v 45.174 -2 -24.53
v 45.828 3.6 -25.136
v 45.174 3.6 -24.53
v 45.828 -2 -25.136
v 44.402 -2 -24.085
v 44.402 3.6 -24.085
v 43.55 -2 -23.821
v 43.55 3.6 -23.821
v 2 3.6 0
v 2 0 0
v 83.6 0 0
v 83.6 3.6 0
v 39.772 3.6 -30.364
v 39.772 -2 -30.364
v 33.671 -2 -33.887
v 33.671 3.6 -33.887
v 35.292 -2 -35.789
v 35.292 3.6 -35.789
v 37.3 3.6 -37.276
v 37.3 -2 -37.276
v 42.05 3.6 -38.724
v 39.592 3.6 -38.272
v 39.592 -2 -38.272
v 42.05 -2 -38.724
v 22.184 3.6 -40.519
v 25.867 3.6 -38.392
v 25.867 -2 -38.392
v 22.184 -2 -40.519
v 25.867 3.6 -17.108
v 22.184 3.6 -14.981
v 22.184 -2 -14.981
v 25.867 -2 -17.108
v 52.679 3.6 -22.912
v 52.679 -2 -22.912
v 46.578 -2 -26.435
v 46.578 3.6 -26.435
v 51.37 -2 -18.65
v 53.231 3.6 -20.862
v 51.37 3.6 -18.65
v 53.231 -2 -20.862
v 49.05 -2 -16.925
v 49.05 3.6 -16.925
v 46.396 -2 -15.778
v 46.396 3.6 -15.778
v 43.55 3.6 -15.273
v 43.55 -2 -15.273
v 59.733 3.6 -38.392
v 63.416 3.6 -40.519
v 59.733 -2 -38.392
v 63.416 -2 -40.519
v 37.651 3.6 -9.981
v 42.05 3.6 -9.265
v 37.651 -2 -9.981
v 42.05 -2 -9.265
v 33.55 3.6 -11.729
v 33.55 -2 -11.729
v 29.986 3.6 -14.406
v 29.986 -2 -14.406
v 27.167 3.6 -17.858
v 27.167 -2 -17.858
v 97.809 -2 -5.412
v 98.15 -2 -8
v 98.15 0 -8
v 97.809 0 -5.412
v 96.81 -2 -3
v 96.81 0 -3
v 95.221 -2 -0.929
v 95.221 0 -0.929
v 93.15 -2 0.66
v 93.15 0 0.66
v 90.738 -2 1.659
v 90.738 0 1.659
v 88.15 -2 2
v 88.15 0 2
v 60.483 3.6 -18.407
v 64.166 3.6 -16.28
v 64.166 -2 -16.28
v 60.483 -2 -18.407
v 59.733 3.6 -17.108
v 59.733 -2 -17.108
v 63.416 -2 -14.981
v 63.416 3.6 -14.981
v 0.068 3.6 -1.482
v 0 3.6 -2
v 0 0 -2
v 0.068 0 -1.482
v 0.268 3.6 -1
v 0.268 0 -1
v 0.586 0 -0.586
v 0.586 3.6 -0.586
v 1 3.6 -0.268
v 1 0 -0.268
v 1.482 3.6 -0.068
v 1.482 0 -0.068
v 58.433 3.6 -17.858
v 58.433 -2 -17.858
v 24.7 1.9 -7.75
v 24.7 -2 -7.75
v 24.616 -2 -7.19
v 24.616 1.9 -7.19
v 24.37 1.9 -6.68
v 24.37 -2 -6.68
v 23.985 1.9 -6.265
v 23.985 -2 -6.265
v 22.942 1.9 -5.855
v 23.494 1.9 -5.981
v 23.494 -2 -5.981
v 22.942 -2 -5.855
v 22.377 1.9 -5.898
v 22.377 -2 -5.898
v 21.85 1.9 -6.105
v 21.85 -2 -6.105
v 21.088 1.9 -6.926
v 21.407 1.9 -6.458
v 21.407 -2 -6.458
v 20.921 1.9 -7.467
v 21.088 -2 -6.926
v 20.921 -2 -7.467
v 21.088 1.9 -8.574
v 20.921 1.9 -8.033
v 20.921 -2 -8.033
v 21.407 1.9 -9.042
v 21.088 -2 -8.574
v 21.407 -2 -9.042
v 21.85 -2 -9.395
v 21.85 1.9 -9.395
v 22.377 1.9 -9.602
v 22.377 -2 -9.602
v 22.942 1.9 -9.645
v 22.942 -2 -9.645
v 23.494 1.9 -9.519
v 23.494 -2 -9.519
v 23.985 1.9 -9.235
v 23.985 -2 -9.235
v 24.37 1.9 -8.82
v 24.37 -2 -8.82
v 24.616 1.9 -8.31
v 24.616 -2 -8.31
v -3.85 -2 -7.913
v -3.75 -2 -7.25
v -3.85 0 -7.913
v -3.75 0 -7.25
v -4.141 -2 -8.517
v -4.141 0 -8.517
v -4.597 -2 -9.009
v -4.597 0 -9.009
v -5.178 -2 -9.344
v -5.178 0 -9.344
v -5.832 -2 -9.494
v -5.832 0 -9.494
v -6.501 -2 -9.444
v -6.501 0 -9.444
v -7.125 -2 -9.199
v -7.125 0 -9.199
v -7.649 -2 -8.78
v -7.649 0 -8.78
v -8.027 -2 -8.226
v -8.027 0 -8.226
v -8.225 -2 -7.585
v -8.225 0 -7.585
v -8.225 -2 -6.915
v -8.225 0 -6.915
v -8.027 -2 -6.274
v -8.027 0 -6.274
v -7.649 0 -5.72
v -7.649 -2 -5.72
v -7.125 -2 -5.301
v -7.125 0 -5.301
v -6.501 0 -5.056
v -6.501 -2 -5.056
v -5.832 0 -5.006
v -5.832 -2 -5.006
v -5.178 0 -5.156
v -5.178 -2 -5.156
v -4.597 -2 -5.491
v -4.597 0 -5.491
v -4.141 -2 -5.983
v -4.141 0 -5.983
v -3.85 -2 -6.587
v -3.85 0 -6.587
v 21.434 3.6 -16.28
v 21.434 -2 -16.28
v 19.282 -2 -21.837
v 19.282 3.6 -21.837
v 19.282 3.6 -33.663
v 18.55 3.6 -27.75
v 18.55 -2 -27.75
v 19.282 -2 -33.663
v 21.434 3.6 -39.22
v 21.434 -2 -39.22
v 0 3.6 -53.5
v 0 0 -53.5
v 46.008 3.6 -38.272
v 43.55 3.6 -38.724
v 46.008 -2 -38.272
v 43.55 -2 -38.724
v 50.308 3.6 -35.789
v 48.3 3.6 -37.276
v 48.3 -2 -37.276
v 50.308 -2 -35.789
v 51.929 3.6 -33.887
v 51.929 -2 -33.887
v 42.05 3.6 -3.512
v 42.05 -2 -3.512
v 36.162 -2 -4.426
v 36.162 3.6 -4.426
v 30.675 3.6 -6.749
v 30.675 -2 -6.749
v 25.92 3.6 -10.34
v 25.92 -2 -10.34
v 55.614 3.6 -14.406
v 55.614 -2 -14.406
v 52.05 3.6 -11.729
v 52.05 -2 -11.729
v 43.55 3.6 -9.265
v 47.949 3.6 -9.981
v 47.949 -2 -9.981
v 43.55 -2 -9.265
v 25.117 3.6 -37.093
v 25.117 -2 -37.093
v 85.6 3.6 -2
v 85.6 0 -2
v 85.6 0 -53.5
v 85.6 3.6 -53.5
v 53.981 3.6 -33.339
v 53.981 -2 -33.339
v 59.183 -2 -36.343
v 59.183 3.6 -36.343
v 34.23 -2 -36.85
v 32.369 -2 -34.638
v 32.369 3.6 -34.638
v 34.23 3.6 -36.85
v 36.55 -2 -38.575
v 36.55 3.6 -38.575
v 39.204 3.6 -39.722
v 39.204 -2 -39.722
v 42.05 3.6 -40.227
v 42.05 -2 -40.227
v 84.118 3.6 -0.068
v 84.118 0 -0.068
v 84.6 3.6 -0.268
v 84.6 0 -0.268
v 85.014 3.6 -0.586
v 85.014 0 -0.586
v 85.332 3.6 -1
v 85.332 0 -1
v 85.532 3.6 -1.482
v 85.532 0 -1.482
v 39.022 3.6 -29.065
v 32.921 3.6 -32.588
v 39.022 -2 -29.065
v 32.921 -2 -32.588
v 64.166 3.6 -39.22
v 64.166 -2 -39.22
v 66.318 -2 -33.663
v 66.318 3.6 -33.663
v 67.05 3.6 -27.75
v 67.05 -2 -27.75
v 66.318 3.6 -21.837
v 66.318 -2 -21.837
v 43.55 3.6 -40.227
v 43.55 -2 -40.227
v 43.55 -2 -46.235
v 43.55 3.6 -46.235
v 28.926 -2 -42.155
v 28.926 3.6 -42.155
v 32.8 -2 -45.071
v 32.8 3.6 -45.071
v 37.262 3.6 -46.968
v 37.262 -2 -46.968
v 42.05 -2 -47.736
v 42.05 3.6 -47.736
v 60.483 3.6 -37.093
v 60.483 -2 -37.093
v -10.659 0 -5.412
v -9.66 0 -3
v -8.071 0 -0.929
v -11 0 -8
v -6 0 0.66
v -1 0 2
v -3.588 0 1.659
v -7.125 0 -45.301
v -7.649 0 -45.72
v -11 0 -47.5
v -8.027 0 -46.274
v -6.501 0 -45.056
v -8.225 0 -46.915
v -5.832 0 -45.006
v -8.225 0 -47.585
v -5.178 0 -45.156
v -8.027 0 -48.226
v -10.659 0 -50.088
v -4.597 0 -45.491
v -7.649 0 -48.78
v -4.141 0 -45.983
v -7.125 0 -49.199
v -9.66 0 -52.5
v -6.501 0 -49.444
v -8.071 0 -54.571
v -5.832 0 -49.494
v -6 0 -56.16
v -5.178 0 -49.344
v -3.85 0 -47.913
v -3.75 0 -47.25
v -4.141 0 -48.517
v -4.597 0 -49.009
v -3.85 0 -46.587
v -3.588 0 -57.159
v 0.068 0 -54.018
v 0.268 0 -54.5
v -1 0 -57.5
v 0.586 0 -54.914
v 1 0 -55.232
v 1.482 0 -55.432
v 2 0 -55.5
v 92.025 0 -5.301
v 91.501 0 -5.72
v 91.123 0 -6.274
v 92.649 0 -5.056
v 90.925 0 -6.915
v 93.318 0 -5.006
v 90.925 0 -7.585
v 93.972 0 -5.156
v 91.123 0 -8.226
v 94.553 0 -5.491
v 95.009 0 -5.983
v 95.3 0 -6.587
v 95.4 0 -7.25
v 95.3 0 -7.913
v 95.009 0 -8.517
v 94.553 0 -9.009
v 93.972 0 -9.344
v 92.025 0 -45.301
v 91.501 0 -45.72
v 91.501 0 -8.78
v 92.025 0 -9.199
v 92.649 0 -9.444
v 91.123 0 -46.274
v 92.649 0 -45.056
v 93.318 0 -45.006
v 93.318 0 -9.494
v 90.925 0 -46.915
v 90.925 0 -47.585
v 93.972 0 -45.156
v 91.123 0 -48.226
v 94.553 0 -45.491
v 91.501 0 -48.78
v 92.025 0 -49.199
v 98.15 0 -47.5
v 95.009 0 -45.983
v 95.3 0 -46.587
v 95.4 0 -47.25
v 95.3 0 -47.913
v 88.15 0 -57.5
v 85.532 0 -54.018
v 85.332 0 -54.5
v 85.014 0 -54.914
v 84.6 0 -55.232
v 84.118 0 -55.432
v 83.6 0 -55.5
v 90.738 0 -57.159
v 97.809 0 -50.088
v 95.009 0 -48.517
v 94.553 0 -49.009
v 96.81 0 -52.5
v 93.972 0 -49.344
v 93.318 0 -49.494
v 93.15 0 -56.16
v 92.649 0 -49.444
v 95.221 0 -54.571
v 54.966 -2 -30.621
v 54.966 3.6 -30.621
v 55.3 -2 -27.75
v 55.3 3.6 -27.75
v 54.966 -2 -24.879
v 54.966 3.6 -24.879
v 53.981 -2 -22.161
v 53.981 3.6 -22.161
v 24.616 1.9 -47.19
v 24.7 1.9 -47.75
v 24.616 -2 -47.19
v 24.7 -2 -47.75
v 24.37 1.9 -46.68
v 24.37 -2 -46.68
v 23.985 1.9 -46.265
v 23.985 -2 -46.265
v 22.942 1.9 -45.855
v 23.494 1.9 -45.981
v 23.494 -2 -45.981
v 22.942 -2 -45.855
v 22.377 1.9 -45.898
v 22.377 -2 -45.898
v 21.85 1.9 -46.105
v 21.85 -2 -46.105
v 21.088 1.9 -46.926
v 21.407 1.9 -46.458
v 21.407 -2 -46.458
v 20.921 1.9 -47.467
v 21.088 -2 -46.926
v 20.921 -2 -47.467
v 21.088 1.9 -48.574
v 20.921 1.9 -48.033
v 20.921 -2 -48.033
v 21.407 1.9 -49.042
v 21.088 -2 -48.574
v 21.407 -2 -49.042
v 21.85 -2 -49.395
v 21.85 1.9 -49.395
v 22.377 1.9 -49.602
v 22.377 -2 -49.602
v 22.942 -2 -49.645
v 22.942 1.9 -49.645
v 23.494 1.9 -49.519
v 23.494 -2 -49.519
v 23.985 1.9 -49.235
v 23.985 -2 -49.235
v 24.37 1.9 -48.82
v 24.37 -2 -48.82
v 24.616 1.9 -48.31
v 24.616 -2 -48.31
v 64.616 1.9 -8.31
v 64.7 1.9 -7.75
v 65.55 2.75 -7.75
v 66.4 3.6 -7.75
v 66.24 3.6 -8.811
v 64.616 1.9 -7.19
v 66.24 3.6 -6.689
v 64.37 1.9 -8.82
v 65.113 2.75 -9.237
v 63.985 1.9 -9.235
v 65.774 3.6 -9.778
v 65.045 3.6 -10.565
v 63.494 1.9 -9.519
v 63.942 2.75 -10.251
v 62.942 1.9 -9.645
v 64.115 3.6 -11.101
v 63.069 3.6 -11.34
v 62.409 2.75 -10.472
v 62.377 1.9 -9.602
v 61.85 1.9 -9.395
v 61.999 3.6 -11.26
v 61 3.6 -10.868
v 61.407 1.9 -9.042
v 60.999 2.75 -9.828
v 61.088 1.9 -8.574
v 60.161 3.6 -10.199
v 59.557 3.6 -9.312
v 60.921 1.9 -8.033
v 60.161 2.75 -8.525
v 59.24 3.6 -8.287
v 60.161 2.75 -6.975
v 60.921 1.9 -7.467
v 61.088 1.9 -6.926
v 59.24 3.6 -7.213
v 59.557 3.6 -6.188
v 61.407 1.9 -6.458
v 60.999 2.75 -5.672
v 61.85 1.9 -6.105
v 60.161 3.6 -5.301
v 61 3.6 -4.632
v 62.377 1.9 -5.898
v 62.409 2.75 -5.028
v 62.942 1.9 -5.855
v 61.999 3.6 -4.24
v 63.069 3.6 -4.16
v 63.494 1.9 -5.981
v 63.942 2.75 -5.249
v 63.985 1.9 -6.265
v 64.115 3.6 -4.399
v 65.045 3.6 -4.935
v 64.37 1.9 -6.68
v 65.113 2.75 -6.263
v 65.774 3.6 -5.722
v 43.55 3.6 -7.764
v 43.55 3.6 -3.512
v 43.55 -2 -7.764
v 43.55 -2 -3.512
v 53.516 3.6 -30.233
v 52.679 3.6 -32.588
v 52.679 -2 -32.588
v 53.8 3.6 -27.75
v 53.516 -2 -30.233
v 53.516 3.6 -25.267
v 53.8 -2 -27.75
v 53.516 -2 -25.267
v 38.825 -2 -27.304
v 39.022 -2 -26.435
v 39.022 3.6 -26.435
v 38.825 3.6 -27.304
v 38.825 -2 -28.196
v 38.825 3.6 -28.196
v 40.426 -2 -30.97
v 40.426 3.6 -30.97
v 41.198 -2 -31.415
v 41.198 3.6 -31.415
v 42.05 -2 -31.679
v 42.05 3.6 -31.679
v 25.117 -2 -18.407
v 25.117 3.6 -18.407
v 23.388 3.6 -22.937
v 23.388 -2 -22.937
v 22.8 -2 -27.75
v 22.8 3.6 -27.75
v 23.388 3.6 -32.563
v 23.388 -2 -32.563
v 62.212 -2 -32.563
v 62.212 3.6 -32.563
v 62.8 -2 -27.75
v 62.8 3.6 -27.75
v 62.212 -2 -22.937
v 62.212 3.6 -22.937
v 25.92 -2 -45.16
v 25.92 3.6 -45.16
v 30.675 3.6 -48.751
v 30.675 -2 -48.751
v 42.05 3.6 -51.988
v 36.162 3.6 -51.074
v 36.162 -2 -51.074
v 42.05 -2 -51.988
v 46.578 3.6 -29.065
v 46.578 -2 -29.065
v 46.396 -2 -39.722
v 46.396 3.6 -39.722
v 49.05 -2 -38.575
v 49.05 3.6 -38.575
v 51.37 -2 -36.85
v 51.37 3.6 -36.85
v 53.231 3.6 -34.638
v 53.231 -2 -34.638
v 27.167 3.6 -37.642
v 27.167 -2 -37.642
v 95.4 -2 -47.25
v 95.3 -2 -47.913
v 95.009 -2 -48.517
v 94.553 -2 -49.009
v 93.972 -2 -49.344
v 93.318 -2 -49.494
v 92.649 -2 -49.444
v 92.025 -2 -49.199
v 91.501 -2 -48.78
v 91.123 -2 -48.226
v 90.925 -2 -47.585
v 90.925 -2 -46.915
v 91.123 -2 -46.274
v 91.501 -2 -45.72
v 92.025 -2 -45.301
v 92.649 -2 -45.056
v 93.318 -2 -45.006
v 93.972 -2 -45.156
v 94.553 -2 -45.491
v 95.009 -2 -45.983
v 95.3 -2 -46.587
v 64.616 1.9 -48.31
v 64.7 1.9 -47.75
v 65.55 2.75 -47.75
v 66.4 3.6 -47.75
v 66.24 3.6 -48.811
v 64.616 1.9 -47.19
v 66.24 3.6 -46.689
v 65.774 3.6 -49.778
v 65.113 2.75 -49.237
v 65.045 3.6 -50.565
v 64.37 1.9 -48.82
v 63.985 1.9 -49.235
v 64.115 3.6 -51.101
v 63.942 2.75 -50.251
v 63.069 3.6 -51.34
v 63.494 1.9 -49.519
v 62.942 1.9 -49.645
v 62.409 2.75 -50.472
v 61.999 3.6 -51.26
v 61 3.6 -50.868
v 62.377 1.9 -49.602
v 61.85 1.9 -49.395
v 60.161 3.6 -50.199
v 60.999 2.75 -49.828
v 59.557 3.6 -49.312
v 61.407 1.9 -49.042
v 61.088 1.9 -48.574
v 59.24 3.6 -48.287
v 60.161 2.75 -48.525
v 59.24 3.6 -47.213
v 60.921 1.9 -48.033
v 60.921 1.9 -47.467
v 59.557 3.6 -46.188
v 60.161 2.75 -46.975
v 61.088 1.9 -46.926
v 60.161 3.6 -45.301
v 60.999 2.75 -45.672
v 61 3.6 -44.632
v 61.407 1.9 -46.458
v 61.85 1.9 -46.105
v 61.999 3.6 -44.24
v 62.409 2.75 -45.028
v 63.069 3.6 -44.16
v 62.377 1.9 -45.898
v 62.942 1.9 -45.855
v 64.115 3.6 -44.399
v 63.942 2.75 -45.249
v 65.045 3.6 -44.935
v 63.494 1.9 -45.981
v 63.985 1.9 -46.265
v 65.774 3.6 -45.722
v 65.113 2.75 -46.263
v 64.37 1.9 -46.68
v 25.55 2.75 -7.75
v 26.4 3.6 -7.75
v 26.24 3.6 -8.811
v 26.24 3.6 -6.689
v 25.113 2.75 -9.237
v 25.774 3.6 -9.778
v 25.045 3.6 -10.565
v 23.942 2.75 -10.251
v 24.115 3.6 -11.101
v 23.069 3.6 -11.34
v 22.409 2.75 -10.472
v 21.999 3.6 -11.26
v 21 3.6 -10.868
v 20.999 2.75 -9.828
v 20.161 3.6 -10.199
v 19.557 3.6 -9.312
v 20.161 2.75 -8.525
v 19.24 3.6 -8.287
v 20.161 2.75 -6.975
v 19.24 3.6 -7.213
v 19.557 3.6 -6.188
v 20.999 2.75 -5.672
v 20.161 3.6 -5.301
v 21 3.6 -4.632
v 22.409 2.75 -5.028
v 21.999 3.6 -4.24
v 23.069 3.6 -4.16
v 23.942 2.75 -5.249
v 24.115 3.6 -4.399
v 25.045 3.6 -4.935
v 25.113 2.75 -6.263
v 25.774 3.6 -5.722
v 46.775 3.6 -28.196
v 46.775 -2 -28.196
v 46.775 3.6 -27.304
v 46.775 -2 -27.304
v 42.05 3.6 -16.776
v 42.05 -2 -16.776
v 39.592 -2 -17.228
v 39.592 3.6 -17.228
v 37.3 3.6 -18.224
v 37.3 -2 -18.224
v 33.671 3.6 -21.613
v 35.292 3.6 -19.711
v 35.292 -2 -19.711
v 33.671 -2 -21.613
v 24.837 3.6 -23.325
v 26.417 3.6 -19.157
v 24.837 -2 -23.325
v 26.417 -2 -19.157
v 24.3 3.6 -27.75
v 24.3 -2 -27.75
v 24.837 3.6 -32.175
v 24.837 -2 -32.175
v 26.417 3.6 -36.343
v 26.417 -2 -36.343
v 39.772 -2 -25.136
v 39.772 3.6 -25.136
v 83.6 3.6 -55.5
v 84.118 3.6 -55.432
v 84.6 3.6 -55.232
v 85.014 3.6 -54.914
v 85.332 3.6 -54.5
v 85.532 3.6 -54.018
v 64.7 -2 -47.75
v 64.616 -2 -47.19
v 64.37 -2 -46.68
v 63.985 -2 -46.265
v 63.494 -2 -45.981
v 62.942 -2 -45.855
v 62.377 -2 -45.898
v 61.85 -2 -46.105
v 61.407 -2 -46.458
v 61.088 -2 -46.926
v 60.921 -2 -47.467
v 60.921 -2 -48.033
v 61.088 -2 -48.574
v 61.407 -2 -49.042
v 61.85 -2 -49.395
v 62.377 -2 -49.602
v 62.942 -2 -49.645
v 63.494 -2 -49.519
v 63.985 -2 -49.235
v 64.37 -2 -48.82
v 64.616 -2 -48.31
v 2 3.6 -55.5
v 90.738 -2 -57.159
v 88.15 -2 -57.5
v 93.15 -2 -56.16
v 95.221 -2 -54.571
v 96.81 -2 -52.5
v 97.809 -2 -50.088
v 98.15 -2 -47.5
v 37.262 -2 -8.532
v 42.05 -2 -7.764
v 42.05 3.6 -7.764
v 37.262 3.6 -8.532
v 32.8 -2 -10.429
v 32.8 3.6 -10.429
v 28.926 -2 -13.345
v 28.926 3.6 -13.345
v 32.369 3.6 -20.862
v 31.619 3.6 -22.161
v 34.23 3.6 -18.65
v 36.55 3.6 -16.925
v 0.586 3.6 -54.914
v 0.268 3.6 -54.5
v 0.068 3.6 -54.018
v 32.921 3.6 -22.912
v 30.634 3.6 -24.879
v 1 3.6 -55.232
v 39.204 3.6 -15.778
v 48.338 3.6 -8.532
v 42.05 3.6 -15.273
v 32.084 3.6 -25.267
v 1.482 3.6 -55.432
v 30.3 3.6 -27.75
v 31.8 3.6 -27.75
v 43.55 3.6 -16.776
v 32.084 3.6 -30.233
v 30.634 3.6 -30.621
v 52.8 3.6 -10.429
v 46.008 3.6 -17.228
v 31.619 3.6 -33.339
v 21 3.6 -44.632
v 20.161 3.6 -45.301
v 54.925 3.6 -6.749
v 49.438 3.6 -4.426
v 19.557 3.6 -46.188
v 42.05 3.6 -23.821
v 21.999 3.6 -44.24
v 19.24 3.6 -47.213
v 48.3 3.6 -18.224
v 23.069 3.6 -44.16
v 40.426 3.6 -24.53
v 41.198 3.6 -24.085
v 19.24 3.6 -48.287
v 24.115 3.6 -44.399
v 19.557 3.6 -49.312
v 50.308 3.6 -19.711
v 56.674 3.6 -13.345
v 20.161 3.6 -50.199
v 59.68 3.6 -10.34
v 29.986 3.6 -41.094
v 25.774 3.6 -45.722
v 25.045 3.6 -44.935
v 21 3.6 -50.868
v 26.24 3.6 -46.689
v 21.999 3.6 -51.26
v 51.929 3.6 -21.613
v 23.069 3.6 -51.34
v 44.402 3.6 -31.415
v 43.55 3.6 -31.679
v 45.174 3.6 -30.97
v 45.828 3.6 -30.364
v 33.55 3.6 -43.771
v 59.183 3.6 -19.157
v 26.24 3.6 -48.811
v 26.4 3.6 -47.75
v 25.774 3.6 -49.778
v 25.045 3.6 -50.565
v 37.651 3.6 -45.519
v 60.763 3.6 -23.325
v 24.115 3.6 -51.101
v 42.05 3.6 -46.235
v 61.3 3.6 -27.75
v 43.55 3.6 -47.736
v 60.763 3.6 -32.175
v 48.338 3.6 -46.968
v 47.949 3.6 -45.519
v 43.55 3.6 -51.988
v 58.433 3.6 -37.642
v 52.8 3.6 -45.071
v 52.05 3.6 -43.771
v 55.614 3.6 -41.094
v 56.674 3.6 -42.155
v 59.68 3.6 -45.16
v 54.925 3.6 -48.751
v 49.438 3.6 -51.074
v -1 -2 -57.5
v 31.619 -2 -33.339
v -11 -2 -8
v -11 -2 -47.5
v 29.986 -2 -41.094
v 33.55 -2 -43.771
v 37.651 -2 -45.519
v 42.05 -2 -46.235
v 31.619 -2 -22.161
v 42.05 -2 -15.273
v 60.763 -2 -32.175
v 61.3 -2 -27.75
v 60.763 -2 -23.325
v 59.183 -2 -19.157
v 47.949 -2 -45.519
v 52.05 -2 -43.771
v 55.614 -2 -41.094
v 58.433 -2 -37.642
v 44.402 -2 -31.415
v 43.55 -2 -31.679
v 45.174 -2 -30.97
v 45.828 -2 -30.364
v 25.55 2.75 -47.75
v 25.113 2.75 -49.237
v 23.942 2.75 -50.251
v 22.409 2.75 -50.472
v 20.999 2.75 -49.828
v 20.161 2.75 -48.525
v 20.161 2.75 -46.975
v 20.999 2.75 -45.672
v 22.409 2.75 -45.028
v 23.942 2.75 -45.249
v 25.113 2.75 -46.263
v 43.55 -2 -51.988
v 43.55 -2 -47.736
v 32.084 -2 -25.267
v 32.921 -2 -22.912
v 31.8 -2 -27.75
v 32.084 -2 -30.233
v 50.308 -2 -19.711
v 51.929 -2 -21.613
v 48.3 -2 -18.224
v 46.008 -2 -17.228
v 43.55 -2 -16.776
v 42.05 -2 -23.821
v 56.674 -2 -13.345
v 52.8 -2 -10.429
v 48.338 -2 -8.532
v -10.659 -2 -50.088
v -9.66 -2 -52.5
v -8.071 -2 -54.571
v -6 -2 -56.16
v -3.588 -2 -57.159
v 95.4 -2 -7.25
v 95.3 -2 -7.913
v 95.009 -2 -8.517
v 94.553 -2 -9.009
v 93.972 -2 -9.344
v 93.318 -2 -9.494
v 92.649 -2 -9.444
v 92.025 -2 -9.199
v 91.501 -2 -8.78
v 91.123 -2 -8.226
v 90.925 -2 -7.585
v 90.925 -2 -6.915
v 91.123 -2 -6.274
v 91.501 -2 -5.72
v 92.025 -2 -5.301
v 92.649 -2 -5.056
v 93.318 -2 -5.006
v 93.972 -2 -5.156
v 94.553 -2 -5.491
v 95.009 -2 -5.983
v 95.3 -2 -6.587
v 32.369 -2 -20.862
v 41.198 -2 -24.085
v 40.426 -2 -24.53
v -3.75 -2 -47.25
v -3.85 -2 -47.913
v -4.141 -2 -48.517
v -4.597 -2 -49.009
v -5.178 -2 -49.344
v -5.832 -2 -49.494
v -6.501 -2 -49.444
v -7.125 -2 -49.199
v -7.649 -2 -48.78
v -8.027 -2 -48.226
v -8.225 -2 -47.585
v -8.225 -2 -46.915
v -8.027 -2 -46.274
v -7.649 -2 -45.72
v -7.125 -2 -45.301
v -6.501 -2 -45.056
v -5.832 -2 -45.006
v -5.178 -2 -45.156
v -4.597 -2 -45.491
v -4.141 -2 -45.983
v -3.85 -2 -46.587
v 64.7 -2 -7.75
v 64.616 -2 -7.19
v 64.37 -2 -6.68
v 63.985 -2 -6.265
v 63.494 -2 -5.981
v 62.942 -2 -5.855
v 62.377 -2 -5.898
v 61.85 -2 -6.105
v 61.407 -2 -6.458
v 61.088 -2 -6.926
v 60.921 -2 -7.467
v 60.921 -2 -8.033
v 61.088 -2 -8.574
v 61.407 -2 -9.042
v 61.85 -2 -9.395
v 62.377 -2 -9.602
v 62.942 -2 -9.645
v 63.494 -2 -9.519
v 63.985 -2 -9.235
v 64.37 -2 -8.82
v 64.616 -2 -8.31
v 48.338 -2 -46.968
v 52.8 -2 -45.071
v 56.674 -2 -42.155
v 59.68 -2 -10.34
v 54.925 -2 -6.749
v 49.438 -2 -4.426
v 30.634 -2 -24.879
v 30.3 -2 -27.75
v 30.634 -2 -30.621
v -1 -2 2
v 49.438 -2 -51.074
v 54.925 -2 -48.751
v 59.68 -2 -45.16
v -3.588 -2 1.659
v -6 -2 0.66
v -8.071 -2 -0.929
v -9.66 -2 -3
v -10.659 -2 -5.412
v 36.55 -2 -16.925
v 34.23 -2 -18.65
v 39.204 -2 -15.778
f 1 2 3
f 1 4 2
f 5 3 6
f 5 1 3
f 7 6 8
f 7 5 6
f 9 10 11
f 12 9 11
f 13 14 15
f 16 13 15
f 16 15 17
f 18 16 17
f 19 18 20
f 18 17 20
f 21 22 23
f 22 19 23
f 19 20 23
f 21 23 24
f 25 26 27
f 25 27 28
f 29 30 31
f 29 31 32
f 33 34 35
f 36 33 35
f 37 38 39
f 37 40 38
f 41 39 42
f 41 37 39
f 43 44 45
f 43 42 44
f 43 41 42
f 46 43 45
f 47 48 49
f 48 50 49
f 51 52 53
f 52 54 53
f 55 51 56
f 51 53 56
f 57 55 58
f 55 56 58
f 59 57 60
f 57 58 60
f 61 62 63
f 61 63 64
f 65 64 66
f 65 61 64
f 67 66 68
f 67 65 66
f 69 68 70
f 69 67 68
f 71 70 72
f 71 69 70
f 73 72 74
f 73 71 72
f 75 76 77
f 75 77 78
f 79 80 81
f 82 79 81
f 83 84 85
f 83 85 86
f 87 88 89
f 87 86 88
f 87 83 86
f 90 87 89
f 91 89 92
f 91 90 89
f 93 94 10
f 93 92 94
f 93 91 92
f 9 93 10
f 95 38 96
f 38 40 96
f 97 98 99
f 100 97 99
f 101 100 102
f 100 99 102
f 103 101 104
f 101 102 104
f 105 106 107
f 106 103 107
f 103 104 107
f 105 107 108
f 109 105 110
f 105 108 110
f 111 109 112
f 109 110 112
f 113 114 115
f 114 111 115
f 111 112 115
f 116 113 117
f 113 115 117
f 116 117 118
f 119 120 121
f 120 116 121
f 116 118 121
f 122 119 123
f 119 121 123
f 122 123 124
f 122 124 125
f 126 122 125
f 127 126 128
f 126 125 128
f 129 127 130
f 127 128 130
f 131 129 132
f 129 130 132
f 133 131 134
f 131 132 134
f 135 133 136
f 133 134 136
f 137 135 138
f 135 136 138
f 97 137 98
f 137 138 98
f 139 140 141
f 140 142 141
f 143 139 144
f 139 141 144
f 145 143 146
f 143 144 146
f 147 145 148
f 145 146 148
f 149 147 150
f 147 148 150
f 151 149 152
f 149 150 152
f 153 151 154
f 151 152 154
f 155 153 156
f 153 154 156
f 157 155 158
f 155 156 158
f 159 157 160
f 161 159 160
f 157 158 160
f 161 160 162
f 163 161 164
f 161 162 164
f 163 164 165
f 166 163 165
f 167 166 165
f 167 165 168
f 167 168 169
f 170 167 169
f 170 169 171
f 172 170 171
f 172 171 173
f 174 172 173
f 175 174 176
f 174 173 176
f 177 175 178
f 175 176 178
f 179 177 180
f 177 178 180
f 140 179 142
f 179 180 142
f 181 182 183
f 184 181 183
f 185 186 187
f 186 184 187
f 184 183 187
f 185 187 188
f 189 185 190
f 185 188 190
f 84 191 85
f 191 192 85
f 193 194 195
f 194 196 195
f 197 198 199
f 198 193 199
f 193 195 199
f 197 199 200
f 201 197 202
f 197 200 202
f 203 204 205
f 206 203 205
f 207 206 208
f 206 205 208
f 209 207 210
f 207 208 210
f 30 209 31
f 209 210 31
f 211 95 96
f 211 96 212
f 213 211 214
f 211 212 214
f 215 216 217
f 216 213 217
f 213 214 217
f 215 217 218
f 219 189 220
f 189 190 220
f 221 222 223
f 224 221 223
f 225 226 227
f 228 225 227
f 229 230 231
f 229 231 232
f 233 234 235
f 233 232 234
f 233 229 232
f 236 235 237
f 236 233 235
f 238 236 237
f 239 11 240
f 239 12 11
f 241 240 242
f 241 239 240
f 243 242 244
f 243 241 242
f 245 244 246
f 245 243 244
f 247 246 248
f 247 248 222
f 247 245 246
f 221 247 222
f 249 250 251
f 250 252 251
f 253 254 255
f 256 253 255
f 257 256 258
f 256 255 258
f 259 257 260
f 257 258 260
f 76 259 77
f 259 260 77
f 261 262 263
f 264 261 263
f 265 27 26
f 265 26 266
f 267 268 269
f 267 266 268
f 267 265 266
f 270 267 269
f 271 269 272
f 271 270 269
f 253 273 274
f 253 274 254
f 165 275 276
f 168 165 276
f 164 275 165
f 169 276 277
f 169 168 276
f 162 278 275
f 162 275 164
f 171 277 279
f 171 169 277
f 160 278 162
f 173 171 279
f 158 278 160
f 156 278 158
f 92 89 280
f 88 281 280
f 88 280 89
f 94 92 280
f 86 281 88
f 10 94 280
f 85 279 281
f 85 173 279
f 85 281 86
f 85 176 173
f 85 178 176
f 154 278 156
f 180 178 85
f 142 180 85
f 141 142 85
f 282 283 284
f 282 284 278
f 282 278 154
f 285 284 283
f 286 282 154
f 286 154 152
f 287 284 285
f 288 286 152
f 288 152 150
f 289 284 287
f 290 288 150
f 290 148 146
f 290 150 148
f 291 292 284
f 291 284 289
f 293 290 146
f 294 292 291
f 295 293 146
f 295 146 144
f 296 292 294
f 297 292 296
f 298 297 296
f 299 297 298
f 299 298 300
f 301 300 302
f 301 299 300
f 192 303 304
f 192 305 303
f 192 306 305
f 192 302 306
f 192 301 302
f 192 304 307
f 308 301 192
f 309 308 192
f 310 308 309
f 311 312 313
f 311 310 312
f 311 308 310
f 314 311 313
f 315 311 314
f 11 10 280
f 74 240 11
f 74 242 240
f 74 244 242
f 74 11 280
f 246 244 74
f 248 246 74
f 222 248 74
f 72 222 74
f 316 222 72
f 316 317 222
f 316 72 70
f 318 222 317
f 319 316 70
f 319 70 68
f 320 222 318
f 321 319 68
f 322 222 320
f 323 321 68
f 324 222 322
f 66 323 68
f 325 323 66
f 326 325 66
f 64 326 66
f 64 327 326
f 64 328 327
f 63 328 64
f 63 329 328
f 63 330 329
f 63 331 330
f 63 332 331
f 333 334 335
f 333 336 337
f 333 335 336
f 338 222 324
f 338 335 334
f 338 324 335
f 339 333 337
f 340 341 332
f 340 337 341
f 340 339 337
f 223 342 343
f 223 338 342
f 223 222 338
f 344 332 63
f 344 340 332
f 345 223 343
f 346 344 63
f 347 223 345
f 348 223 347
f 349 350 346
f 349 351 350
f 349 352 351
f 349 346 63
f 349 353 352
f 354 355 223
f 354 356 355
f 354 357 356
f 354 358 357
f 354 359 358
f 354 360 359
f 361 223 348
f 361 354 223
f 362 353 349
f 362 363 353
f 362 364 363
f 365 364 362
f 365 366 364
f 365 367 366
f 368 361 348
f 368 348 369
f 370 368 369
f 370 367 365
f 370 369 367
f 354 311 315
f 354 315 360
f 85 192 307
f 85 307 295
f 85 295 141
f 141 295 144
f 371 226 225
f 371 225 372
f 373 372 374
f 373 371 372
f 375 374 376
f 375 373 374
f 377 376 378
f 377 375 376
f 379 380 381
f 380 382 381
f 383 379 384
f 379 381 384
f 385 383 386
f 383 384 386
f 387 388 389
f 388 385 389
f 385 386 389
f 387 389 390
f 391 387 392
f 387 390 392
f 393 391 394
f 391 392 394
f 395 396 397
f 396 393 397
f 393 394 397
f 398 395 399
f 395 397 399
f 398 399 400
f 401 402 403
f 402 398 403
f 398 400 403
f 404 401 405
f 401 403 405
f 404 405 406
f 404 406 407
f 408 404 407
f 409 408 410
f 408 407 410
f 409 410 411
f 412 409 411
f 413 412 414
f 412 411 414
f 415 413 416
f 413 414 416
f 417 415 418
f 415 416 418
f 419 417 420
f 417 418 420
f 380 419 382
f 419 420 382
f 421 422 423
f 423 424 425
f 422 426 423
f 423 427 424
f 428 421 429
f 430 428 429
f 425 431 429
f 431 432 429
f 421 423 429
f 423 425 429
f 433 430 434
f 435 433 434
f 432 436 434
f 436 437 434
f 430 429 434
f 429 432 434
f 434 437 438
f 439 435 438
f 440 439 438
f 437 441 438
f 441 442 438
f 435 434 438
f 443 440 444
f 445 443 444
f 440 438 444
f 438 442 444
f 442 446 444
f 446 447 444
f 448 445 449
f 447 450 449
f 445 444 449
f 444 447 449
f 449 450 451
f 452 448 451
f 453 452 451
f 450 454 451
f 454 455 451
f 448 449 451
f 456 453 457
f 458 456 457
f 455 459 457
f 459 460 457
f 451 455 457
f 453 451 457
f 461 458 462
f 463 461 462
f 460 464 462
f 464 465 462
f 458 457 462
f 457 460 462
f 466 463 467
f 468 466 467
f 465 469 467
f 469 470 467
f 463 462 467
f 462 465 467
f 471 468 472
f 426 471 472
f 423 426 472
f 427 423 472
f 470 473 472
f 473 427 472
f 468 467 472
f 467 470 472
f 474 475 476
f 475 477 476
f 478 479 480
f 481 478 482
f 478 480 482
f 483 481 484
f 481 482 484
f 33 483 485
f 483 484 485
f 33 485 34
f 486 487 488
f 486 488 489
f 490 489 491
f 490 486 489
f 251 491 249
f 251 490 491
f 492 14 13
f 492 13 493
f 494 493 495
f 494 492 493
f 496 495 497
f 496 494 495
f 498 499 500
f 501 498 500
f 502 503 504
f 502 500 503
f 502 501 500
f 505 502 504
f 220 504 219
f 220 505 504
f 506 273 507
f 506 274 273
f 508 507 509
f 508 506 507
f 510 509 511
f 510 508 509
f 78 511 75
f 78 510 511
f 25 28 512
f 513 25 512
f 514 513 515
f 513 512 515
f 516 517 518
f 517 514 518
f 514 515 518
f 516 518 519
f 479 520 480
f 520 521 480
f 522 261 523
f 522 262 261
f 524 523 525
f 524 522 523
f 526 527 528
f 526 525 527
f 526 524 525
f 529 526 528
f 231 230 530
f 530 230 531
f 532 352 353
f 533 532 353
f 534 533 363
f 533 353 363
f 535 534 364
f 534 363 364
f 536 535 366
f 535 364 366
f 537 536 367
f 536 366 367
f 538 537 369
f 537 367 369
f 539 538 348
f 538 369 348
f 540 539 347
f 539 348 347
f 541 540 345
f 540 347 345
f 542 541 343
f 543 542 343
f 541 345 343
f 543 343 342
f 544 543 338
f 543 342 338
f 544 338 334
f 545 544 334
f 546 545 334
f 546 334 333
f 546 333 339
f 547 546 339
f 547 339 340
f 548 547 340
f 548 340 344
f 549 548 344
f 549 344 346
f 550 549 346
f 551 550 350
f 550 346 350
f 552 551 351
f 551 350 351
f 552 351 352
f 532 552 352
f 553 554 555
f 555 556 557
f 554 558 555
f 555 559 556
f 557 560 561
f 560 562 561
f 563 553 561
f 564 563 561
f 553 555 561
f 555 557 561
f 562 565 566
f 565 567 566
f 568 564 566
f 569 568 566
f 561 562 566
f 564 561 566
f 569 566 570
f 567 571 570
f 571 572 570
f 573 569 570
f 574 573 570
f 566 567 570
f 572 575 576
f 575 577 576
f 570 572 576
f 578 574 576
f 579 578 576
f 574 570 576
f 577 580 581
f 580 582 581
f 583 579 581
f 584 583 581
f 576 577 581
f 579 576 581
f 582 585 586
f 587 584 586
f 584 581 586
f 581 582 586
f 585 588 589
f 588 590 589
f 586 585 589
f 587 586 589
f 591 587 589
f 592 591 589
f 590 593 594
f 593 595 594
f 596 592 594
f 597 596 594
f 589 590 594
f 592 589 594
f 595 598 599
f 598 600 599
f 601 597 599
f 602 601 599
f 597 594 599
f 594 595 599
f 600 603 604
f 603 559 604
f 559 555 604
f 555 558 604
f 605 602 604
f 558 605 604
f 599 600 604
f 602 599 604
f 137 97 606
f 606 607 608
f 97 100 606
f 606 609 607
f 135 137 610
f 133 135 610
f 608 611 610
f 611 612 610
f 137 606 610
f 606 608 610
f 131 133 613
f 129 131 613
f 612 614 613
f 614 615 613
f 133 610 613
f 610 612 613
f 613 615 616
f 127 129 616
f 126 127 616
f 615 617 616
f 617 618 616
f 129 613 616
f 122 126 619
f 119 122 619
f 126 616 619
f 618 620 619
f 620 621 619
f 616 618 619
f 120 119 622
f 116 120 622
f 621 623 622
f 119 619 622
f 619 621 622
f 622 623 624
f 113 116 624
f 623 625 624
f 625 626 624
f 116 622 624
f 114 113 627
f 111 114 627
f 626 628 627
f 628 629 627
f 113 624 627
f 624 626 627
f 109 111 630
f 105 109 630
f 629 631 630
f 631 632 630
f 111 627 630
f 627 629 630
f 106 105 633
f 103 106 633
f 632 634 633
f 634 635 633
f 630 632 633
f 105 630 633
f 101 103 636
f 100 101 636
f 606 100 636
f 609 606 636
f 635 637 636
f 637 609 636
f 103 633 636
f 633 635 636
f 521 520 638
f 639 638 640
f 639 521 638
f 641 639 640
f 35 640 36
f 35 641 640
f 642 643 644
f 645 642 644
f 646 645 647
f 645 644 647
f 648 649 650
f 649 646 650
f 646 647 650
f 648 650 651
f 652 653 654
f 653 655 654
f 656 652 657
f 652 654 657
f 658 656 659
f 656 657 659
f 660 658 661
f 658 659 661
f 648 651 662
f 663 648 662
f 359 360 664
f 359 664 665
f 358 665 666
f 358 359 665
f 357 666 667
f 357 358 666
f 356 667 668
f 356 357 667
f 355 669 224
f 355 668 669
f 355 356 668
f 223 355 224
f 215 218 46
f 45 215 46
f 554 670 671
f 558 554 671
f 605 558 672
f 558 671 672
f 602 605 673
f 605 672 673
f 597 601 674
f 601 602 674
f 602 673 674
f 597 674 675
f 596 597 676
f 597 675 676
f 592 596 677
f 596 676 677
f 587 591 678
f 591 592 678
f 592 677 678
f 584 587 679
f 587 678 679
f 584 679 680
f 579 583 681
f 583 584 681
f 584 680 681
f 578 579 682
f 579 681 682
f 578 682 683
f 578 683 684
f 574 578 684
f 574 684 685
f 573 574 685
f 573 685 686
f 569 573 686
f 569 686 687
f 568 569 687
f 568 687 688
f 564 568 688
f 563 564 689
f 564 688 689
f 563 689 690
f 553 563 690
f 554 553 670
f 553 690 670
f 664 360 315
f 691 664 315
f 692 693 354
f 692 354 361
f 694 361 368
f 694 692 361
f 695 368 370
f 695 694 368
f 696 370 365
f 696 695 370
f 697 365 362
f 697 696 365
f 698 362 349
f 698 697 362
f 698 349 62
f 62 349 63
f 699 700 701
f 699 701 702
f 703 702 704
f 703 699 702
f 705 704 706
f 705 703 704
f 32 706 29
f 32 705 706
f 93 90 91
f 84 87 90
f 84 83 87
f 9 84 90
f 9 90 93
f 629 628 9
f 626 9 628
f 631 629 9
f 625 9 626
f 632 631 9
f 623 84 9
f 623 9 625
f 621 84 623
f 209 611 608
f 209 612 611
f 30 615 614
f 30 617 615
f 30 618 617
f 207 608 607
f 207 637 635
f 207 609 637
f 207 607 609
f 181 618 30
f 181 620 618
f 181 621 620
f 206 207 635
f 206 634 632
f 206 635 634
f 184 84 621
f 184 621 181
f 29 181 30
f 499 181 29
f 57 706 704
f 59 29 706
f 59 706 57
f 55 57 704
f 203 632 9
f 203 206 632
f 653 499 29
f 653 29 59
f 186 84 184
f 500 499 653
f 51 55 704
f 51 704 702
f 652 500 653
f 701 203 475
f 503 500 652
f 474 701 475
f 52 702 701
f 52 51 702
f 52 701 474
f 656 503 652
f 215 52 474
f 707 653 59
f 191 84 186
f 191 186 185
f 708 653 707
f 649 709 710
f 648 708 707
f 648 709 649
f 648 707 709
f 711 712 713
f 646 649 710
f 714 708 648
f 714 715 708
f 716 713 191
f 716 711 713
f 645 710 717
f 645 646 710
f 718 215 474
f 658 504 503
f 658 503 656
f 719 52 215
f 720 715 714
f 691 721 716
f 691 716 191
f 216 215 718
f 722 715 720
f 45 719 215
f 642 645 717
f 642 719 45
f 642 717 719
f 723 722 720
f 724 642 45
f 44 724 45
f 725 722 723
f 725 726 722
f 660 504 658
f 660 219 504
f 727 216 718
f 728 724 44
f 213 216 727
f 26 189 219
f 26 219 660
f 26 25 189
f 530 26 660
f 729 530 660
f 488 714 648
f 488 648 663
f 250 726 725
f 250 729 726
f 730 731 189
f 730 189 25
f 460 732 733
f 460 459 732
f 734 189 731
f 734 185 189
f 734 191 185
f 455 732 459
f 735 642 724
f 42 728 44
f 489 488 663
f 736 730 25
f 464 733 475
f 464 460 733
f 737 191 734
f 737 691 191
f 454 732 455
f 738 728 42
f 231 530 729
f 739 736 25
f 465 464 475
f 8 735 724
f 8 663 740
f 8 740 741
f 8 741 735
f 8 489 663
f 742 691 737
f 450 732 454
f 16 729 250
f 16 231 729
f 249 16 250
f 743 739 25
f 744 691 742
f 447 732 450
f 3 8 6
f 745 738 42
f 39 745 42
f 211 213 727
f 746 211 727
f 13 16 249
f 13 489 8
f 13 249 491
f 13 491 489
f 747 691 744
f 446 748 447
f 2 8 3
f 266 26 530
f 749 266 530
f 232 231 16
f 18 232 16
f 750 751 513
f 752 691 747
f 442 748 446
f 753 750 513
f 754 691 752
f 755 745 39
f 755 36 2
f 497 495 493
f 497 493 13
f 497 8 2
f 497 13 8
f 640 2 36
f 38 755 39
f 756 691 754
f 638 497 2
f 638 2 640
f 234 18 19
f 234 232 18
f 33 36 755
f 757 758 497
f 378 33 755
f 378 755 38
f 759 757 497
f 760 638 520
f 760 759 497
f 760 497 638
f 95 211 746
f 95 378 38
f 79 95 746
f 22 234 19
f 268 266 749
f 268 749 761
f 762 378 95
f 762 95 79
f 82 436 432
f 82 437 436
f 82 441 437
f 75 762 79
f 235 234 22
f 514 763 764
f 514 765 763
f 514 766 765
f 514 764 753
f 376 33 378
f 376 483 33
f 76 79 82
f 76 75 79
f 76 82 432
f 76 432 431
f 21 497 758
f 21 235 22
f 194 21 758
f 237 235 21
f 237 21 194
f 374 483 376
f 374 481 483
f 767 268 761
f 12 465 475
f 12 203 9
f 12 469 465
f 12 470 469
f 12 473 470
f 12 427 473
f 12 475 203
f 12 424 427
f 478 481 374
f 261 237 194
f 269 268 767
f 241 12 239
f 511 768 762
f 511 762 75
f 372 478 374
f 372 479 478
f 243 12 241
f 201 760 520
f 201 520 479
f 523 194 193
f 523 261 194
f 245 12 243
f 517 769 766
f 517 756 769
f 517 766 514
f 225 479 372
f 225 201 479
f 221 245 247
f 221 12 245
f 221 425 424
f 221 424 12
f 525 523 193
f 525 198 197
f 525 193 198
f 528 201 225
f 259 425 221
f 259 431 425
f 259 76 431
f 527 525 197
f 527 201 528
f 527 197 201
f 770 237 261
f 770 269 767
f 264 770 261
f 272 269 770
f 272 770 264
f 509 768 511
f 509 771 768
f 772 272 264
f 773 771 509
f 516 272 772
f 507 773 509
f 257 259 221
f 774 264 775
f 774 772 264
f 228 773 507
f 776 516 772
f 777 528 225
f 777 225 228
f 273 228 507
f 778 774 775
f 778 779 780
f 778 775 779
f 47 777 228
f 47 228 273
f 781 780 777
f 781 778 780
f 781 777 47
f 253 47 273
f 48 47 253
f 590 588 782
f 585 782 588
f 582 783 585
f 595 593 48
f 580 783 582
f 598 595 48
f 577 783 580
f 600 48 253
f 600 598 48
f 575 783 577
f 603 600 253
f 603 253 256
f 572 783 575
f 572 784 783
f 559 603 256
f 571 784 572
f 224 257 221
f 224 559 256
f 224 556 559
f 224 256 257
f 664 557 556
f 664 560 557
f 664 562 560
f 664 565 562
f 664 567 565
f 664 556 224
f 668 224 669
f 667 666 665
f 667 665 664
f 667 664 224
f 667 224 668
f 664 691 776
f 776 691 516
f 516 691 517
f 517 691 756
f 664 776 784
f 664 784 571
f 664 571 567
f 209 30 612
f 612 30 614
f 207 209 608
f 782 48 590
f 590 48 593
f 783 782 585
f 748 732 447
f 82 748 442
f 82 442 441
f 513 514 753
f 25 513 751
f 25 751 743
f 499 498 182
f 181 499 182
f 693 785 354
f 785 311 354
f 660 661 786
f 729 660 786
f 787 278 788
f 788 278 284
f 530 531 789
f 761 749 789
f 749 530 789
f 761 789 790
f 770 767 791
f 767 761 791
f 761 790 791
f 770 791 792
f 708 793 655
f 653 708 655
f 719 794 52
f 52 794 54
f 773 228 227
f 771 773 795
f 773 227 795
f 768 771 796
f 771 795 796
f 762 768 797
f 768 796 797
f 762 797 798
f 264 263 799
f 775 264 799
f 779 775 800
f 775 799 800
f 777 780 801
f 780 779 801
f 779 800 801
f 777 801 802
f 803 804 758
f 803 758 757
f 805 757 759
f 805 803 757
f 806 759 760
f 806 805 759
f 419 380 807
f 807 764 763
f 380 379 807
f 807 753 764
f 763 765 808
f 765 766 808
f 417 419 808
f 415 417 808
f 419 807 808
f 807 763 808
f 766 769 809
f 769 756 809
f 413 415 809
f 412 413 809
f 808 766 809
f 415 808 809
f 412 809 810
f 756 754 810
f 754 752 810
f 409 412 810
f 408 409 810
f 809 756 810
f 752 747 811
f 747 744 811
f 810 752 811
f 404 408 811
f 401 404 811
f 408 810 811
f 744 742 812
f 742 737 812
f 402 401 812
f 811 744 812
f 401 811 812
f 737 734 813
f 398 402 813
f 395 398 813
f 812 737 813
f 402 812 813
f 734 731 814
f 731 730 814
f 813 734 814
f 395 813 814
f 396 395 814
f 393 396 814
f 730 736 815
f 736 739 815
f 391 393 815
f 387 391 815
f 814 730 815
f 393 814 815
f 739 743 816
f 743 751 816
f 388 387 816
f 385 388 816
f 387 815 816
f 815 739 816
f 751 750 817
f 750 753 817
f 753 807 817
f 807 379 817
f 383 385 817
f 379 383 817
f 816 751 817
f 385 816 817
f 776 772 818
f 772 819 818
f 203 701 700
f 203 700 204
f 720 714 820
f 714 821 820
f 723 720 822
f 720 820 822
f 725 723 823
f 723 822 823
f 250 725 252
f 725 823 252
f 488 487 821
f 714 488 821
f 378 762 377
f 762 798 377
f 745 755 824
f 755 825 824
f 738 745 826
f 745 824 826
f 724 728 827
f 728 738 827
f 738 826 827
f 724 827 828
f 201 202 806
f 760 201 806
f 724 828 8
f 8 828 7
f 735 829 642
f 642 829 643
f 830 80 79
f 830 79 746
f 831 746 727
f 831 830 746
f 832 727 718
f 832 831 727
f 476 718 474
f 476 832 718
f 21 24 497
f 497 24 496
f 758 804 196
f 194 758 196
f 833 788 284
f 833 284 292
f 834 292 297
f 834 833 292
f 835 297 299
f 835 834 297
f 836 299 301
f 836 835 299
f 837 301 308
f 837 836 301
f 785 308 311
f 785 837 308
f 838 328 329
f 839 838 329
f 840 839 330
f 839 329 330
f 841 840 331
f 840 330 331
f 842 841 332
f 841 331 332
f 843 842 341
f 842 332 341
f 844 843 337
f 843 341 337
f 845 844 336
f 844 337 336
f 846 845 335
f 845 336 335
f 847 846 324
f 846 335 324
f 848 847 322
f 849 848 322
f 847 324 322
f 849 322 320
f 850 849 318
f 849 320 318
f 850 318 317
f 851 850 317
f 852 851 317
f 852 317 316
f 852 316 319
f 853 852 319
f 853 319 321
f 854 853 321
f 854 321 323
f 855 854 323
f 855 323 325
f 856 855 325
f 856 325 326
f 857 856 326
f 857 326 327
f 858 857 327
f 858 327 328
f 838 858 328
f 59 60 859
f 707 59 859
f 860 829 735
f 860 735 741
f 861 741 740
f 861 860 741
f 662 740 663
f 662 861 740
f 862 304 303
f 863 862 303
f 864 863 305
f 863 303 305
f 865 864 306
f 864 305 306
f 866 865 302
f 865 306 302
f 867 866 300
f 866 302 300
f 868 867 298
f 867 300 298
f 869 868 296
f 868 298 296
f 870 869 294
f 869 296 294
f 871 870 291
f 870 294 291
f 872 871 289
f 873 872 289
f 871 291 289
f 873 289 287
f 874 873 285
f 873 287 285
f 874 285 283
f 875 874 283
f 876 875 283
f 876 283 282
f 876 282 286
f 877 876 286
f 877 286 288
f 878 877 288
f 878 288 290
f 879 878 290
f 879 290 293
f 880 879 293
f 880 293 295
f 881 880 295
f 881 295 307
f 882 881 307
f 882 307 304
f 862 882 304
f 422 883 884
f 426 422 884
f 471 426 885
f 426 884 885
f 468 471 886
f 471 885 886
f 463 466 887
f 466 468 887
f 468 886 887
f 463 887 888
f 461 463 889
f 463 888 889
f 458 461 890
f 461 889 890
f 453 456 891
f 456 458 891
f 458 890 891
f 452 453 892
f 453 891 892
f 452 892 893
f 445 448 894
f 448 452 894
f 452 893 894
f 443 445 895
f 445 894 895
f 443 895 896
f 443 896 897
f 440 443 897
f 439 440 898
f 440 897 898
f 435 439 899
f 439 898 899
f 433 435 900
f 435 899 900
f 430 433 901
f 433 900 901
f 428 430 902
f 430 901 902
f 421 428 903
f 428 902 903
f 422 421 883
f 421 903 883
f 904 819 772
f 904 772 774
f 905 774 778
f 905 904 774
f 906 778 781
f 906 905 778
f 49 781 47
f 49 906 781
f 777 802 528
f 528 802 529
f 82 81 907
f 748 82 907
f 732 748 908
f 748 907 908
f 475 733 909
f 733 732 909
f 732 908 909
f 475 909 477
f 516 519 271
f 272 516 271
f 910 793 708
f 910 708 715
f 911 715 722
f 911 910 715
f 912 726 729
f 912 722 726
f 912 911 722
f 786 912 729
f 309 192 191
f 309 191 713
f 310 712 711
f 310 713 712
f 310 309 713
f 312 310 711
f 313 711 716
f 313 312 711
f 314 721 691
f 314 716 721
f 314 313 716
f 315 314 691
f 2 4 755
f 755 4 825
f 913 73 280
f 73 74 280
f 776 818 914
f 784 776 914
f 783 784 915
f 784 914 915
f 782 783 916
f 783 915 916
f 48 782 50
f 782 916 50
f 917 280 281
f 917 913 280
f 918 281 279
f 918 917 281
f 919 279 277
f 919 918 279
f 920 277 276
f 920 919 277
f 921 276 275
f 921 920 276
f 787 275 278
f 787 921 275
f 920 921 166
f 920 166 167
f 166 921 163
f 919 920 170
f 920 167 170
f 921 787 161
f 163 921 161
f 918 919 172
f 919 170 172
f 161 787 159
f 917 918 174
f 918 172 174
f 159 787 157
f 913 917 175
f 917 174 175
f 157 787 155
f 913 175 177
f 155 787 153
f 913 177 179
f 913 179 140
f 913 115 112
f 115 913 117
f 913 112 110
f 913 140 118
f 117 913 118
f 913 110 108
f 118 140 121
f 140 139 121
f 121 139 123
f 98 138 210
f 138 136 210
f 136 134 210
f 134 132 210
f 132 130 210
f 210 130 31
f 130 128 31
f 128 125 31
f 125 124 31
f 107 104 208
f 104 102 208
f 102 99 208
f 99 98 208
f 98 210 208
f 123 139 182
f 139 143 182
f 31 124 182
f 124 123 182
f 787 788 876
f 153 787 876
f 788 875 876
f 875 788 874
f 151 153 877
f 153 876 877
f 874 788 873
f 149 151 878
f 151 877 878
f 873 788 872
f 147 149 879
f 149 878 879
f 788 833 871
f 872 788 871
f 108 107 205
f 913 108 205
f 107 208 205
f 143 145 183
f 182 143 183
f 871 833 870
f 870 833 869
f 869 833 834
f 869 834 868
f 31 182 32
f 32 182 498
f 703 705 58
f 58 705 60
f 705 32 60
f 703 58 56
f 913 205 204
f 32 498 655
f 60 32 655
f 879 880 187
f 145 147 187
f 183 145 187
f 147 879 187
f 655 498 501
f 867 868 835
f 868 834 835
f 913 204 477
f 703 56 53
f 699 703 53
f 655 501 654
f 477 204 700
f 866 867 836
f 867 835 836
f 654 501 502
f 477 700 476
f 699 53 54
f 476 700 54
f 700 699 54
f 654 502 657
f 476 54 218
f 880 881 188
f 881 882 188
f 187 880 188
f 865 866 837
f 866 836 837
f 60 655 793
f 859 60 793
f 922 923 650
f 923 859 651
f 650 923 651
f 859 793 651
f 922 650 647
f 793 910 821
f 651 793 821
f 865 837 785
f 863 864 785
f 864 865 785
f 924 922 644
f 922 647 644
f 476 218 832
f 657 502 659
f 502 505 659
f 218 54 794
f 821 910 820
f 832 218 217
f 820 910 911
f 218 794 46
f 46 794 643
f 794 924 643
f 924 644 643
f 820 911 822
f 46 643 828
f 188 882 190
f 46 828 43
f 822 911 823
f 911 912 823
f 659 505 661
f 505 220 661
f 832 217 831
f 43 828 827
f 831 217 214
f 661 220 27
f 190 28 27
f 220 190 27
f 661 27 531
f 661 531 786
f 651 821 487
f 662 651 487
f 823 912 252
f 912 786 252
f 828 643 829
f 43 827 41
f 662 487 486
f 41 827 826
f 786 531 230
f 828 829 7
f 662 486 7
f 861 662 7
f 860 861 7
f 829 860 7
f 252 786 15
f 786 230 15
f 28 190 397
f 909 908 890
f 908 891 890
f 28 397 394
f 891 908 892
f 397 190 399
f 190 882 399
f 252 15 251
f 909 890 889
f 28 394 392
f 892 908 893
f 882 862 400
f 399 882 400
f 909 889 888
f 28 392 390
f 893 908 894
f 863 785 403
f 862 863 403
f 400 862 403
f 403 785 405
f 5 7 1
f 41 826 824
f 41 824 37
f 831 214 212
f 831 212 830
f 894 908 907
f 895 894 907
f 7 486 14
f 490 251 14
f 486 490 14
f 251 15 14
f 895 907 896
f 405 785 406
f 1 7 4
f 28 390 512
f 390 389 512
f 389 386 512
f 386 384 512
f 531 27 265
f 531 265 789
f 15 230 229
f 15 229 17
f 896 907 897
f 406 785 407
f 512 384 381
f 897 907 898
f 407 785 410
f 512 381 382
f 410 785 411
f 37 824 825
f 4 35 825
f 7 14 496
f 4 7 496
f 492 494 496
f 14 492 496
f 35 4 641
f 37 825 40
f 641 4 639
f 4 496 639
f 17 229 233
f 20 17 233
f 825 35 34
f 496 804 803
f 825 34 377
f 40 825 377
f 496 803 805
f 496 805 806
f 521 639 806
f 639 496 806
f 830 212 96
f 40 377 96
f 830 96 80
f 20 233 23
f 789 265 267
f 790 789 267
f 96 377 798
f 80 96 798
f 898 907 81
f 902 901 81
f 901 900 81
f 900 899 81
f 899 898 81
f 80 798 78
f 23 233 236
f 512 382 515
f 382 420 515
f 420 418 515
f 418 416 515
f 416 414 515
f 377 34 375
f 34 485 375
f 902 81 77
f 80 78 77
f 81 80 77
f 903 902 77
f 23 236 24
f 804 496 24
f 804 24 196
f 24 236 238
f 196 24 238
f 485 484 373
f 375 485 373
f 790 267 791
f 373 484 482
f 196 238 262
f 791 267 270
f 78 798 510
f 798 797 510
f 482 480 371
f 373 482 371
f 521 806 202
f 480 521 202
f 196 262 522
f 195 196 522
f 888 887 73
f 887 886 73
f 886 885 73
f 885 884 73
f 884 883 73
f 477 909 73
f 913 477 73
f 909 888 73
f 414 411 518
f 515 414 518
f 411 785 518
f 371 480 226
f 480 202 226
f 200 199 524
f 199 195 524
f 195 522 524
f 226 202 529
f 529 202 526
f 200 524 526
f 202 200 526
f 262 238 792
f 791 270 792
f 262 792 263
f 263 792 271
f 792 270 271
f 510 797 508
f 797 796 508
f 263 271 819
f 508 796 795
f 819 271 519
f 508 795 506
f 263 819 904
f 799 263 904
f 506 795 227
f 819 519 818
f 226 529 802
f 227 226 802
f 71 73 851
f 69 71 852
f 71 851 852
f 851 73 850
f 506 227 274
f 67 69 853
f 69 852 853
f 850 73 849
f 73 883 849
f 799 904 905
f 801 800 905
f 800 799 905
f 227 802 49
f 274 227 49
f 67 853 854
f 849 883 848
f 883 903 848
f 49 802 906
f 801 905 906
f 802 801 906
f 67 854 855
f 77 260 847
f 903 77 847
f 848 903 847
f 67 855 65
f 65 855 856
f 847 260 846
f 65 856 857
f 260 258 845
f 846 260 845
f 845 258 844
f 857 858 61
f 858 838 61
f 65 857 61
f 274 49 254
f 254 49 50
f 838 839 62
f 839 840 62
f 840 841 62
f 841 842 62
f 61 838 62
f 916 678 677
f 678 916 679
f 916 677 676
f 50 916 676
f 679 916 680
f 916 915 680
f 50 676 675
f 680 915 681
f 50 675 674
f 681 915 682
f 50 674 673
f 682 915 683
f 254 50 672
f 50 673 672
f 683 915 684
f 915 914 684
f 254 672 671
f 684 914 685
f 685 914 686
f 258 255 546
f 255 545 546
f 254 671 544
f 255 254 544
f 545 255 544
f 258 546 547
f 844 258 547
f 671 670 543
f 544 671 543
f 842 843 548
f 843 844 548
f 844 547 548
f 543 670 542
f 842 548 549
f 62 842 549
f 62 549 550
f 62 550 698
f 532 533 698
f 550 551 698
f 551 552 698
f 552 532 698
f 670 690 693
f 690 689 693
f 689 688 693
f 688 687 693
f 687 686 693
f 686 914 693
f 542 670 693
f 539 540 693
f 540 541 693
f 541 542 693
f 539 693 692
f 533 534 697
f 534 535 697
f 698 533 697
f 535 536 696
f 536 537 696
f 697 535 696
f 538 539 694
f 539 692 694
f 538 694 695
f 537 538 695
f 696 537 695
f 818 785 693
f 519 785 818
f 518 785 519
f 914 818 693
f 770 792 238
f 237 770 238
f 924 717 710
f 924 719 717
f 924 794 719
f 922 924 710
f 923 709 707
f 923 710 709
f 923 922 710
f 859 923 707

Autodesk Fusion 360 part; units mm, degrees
sketch "Sketch1" plane through (0, 0, 0) normal (0, 1, 0) x (1, 0, 0)
  line L0 (0, 0) -> (85.6, 0)
  line L1 (85.6, 0) -> (85.6, 55.5)
  line L2 (85.6, 55.5) -> (0, 55.5)
  line L3 (0, 55.5) -> (0, 0)
  line L4 (0, 55.5) -> (85.6, 0) construction
  line L5 (0, 0) -> (85.6, 55.5) construction
  line L6 (62.8, 47.75) -> (22.8, 47.75) construction
  line L7 (22.8, 47.75) -> (22.8, 7.75) construction
  line L8 (22.8, 7.75) -> (62.8, 7.75) construction
  line L9 (62.8, 7.75) -> (62.8, 47.75) construction
  line L10 (62.8, 47.75) -> (22.8, 7.75) construction
  line L11 (22.8, 47.75) -> (62.8, 7.75) construction
  circle A0 centre (62.8, 47.75) radius 1.9
  circle A1 centre (62.8, 7.75) radius 1.9
  circle A2 centre (22.8, 7.75) radius 1.9
  circle A3 centre (22.8, 47.75) radius 1.9
  line L12 (68.05, 2.5) -> (17.55, 2.5) construction
  line L13 (17.55, 2.5) -> (17.55, 53) construction
  line L14 (17.55, 53) -> (68.05, 53) construction
  line L15 (68.05, 53) -> (68.05, 2.5) construction
  line L16 (68.05, 2.5) -> (17.55, 53) construction
  line L17 (17.55, 2.5) -> (68.05, 53) construction
  circle A4 centre (42.8, 27.75) radius 24.25
  line L18 (43.55, 53) -> (42.05, 53) construction
  line L19 (42.05, 53) -> (42.05, 27.75)
  line L20 (42.05, 27.75) -> (43.55, 27.75)
  line L21 (43.55, 27.75) -> (43.55, 53)
  line L22 (43.175, 28.3995) -> (21.3079, 41.0245)
  line L23 (20.5579, 39.7255) -> (42.425, 27.1005)
  line L24 (42.425, 28.3995) -> (20.5579, 15.7745)
  line L25 (21.3079, 14.4755) -> (43.175, 27.1005)
  line L26 (42.05, 27.75) -> (42.05, 2.5)
  line L27 (43.55, 2.5) -> (43.55, 27.75)
  line L28 (42.425, 27.1005) -> (64.2921, 14.4755)
  line L29 (65.0421, 15.7745) -> (43.175, 28.3995)
  line L30 (43.175, 27.1005) -> (65.0421, 39.7255)
  line L31 (64.2921, 41.0245) -> (42.425, 28.3995)
  circle A5 centre (42.8, 27.75) radius 20
  circle A6 centre (42.8, 27.75) radius 18.5
  circle A7 centre (42.8, 27.75) radius 12.5
  circle A8 centre (42.8, 27.75) radius 11
  circle A9 centre (42.8, 27.75) radius 4
  line L32 (85.6, 7.25) -> (95.4, 7.25) construction
  circle A10 centre (93.15, 7.25) radius 2.25
  line L33 (93.15, 7.25) -> (93.15, 9.5) construction
  line L34 (93.15, 9.5) -> (93.15, 45) construction
  circle A11 centre (93.15, 47.25) radius 2.25
  line L35 (93.15, 47.25) -> (93.15, 45) construction
  line L36 (85.6, 0) -> (93.15, 0) construction
  line L37 (93.15, 0) -> (93.15, 7.25) construction
  line L38 (85.6, 7.25) -> (0, 7.25) construction
  line L39 (0, 7.25) -> (-6, 7.25) construction
  line L40 (-6, 7.25) -> (-6, 47.25) construction
  line L41 (93.15, 47.25) -> (-6, 47.25) construction
  circle A12 centre (-6, 47.25) radius 2.25
  circle A13 centre (-6, 7.25) radius 2.25
  line L42 (-11, 57.5) -> (98.15, 57.5)
  line L43 (98.15, 57.5) -> (98.15, -2)
  line L44 (98.15, -2) -> (-11, -2)
  line L45 (-11, -2) -> (-11, 57.5)
  point P0 (42.8, 27.75)
  point P1 (42.8, 27.75)
  dimension "d1" = 85.6
  dimension "d2" = 55.5
  dimension "d3" = 40
  dimension "d4" = 40
  dimension "d5" = 3.8
  dimension "d6" = 3.8
  dimension "d7" = 3.8
  dimension "d8" = 3.8
  dimension "d9" = 50.5
  dimension "d10" = 50.5
  dimension "d11" = 48.5
  dimension "d12" = 1.5
  dimension "d14" = 360
  dimension "d15" = -1.5
  dimension "d16" = 25
  dimension "d17" = -1.5
  dimension "d18" = 8
  dimension "d19" = 9.8
  dimension "d20" = 4.5
  dimension "d21" = 35.5
  dimension "d22" = 4.5
  dimension "d23" = 7.25
  dimension "d24" = 6
  dimension "d25" = 4.5
  dimension "d26" = 4.5
  dimension "d27" = 5
  dimension "d28" = 5
  dimension "d29" = 2
  dimension "d30" = 2
extrude "Extrude1" add sketch "Sketch1" along normal blind 3.6 and the other way blind 2 contours L0 L1 L2 L3 | A4 L30 L31 A5 | A4 L28 L29 A5 | L29 L30 A5 A6 | L30 L31 A5 A6 | L28 L29 A5 A6 | A4 L19 L21 A5 | L21 L31 A5 A6 | L30 L31 A6 A7 | A4 L26 L27 A5 | L27 L28 A5 A6 | L28 L29 A6 A7 | L19 L21 A5 A6 | L29 L30 A7 A8 | L30 L31 A7 A8 | L26 L27 A5 A6 | L28 L29 A7 A8 | A4 L22 L23 A5 | L19 L22 A5 A6 | L19 L21 A6 A7 | L21 L31 A7 A8 | L30 L31 A8 A9 | A4 L24 L25 A5 | L25 L26 A5 A6 | L26 L27 A6 A7 | L27 L28 A7 A8 | L28 L29 A8 A9 | L22 L23 A5 A6 | L19 L21 A7 A8 | L29 L30 A9 | L21 L29 L30 L31 A9 | L24 L25 A5 A6 | L26 L27 A7 A8 | L27 L28 L29 L30 A9 | L23 L24 A5 A6 | L22 L23 A6 A7 | L19 L22 A7 A8 | L19 L21 A8 A9 | L21 L31 A9 | L21 L27 L29 L30 | L24 L25 A6 A7 | L25 L26 A7 A8 | L26 L27 A8 A9 | L27 L28 A9 | L22 L23 A7 A8 | L19 L21 L22 L31 A9 | L21 L22 L29 L31 | L19 L20 L21 L22 L24 L29 L31 | L20 L23 L25 L26 L27 L28 L30 | L25 L27 L28 L30 | L24 L25 A7 A8 | L25 L26 L27 L28 A9 | L23 L24 A7 A8 | L22 L23 A8 A9 | L19 L22 A9 | L19 L22 L24 L31 | L24 L25 A8 A9 | L25 L26 A9 | L23 L25 L26 L28 | L19 L22 L23 L24 A9 | L19 L23 L24 L26 | L23 L24 L25 L26 A9 | L23 L24 A9
extrude "Extrude2" add sketch "Sketch1" against normal blind 2 contours L42 L43 L44 L45
fillet "Fillet1" radius 10 4 edges at (98.15, -1, -57.5) (98.15, -1, 2) (-11, -1, 2) (-11, -1, -57.5)
fillet "Fillet2" radius 2 4 edges at (0, 1.8, 0) (85.6, 1.8, 0) (85.6, 1.8, -55.5) (0, 1.8, -55.5)
chamfer "Chamfer1" distance 1.7 angle 45 4 edges at (21.0286, 3.6, -48.4371) (61.0286, 3.6, -48.4371) (61.0286, 3.6, -8.4371) (21.0286, 3.6, -8.4371)
